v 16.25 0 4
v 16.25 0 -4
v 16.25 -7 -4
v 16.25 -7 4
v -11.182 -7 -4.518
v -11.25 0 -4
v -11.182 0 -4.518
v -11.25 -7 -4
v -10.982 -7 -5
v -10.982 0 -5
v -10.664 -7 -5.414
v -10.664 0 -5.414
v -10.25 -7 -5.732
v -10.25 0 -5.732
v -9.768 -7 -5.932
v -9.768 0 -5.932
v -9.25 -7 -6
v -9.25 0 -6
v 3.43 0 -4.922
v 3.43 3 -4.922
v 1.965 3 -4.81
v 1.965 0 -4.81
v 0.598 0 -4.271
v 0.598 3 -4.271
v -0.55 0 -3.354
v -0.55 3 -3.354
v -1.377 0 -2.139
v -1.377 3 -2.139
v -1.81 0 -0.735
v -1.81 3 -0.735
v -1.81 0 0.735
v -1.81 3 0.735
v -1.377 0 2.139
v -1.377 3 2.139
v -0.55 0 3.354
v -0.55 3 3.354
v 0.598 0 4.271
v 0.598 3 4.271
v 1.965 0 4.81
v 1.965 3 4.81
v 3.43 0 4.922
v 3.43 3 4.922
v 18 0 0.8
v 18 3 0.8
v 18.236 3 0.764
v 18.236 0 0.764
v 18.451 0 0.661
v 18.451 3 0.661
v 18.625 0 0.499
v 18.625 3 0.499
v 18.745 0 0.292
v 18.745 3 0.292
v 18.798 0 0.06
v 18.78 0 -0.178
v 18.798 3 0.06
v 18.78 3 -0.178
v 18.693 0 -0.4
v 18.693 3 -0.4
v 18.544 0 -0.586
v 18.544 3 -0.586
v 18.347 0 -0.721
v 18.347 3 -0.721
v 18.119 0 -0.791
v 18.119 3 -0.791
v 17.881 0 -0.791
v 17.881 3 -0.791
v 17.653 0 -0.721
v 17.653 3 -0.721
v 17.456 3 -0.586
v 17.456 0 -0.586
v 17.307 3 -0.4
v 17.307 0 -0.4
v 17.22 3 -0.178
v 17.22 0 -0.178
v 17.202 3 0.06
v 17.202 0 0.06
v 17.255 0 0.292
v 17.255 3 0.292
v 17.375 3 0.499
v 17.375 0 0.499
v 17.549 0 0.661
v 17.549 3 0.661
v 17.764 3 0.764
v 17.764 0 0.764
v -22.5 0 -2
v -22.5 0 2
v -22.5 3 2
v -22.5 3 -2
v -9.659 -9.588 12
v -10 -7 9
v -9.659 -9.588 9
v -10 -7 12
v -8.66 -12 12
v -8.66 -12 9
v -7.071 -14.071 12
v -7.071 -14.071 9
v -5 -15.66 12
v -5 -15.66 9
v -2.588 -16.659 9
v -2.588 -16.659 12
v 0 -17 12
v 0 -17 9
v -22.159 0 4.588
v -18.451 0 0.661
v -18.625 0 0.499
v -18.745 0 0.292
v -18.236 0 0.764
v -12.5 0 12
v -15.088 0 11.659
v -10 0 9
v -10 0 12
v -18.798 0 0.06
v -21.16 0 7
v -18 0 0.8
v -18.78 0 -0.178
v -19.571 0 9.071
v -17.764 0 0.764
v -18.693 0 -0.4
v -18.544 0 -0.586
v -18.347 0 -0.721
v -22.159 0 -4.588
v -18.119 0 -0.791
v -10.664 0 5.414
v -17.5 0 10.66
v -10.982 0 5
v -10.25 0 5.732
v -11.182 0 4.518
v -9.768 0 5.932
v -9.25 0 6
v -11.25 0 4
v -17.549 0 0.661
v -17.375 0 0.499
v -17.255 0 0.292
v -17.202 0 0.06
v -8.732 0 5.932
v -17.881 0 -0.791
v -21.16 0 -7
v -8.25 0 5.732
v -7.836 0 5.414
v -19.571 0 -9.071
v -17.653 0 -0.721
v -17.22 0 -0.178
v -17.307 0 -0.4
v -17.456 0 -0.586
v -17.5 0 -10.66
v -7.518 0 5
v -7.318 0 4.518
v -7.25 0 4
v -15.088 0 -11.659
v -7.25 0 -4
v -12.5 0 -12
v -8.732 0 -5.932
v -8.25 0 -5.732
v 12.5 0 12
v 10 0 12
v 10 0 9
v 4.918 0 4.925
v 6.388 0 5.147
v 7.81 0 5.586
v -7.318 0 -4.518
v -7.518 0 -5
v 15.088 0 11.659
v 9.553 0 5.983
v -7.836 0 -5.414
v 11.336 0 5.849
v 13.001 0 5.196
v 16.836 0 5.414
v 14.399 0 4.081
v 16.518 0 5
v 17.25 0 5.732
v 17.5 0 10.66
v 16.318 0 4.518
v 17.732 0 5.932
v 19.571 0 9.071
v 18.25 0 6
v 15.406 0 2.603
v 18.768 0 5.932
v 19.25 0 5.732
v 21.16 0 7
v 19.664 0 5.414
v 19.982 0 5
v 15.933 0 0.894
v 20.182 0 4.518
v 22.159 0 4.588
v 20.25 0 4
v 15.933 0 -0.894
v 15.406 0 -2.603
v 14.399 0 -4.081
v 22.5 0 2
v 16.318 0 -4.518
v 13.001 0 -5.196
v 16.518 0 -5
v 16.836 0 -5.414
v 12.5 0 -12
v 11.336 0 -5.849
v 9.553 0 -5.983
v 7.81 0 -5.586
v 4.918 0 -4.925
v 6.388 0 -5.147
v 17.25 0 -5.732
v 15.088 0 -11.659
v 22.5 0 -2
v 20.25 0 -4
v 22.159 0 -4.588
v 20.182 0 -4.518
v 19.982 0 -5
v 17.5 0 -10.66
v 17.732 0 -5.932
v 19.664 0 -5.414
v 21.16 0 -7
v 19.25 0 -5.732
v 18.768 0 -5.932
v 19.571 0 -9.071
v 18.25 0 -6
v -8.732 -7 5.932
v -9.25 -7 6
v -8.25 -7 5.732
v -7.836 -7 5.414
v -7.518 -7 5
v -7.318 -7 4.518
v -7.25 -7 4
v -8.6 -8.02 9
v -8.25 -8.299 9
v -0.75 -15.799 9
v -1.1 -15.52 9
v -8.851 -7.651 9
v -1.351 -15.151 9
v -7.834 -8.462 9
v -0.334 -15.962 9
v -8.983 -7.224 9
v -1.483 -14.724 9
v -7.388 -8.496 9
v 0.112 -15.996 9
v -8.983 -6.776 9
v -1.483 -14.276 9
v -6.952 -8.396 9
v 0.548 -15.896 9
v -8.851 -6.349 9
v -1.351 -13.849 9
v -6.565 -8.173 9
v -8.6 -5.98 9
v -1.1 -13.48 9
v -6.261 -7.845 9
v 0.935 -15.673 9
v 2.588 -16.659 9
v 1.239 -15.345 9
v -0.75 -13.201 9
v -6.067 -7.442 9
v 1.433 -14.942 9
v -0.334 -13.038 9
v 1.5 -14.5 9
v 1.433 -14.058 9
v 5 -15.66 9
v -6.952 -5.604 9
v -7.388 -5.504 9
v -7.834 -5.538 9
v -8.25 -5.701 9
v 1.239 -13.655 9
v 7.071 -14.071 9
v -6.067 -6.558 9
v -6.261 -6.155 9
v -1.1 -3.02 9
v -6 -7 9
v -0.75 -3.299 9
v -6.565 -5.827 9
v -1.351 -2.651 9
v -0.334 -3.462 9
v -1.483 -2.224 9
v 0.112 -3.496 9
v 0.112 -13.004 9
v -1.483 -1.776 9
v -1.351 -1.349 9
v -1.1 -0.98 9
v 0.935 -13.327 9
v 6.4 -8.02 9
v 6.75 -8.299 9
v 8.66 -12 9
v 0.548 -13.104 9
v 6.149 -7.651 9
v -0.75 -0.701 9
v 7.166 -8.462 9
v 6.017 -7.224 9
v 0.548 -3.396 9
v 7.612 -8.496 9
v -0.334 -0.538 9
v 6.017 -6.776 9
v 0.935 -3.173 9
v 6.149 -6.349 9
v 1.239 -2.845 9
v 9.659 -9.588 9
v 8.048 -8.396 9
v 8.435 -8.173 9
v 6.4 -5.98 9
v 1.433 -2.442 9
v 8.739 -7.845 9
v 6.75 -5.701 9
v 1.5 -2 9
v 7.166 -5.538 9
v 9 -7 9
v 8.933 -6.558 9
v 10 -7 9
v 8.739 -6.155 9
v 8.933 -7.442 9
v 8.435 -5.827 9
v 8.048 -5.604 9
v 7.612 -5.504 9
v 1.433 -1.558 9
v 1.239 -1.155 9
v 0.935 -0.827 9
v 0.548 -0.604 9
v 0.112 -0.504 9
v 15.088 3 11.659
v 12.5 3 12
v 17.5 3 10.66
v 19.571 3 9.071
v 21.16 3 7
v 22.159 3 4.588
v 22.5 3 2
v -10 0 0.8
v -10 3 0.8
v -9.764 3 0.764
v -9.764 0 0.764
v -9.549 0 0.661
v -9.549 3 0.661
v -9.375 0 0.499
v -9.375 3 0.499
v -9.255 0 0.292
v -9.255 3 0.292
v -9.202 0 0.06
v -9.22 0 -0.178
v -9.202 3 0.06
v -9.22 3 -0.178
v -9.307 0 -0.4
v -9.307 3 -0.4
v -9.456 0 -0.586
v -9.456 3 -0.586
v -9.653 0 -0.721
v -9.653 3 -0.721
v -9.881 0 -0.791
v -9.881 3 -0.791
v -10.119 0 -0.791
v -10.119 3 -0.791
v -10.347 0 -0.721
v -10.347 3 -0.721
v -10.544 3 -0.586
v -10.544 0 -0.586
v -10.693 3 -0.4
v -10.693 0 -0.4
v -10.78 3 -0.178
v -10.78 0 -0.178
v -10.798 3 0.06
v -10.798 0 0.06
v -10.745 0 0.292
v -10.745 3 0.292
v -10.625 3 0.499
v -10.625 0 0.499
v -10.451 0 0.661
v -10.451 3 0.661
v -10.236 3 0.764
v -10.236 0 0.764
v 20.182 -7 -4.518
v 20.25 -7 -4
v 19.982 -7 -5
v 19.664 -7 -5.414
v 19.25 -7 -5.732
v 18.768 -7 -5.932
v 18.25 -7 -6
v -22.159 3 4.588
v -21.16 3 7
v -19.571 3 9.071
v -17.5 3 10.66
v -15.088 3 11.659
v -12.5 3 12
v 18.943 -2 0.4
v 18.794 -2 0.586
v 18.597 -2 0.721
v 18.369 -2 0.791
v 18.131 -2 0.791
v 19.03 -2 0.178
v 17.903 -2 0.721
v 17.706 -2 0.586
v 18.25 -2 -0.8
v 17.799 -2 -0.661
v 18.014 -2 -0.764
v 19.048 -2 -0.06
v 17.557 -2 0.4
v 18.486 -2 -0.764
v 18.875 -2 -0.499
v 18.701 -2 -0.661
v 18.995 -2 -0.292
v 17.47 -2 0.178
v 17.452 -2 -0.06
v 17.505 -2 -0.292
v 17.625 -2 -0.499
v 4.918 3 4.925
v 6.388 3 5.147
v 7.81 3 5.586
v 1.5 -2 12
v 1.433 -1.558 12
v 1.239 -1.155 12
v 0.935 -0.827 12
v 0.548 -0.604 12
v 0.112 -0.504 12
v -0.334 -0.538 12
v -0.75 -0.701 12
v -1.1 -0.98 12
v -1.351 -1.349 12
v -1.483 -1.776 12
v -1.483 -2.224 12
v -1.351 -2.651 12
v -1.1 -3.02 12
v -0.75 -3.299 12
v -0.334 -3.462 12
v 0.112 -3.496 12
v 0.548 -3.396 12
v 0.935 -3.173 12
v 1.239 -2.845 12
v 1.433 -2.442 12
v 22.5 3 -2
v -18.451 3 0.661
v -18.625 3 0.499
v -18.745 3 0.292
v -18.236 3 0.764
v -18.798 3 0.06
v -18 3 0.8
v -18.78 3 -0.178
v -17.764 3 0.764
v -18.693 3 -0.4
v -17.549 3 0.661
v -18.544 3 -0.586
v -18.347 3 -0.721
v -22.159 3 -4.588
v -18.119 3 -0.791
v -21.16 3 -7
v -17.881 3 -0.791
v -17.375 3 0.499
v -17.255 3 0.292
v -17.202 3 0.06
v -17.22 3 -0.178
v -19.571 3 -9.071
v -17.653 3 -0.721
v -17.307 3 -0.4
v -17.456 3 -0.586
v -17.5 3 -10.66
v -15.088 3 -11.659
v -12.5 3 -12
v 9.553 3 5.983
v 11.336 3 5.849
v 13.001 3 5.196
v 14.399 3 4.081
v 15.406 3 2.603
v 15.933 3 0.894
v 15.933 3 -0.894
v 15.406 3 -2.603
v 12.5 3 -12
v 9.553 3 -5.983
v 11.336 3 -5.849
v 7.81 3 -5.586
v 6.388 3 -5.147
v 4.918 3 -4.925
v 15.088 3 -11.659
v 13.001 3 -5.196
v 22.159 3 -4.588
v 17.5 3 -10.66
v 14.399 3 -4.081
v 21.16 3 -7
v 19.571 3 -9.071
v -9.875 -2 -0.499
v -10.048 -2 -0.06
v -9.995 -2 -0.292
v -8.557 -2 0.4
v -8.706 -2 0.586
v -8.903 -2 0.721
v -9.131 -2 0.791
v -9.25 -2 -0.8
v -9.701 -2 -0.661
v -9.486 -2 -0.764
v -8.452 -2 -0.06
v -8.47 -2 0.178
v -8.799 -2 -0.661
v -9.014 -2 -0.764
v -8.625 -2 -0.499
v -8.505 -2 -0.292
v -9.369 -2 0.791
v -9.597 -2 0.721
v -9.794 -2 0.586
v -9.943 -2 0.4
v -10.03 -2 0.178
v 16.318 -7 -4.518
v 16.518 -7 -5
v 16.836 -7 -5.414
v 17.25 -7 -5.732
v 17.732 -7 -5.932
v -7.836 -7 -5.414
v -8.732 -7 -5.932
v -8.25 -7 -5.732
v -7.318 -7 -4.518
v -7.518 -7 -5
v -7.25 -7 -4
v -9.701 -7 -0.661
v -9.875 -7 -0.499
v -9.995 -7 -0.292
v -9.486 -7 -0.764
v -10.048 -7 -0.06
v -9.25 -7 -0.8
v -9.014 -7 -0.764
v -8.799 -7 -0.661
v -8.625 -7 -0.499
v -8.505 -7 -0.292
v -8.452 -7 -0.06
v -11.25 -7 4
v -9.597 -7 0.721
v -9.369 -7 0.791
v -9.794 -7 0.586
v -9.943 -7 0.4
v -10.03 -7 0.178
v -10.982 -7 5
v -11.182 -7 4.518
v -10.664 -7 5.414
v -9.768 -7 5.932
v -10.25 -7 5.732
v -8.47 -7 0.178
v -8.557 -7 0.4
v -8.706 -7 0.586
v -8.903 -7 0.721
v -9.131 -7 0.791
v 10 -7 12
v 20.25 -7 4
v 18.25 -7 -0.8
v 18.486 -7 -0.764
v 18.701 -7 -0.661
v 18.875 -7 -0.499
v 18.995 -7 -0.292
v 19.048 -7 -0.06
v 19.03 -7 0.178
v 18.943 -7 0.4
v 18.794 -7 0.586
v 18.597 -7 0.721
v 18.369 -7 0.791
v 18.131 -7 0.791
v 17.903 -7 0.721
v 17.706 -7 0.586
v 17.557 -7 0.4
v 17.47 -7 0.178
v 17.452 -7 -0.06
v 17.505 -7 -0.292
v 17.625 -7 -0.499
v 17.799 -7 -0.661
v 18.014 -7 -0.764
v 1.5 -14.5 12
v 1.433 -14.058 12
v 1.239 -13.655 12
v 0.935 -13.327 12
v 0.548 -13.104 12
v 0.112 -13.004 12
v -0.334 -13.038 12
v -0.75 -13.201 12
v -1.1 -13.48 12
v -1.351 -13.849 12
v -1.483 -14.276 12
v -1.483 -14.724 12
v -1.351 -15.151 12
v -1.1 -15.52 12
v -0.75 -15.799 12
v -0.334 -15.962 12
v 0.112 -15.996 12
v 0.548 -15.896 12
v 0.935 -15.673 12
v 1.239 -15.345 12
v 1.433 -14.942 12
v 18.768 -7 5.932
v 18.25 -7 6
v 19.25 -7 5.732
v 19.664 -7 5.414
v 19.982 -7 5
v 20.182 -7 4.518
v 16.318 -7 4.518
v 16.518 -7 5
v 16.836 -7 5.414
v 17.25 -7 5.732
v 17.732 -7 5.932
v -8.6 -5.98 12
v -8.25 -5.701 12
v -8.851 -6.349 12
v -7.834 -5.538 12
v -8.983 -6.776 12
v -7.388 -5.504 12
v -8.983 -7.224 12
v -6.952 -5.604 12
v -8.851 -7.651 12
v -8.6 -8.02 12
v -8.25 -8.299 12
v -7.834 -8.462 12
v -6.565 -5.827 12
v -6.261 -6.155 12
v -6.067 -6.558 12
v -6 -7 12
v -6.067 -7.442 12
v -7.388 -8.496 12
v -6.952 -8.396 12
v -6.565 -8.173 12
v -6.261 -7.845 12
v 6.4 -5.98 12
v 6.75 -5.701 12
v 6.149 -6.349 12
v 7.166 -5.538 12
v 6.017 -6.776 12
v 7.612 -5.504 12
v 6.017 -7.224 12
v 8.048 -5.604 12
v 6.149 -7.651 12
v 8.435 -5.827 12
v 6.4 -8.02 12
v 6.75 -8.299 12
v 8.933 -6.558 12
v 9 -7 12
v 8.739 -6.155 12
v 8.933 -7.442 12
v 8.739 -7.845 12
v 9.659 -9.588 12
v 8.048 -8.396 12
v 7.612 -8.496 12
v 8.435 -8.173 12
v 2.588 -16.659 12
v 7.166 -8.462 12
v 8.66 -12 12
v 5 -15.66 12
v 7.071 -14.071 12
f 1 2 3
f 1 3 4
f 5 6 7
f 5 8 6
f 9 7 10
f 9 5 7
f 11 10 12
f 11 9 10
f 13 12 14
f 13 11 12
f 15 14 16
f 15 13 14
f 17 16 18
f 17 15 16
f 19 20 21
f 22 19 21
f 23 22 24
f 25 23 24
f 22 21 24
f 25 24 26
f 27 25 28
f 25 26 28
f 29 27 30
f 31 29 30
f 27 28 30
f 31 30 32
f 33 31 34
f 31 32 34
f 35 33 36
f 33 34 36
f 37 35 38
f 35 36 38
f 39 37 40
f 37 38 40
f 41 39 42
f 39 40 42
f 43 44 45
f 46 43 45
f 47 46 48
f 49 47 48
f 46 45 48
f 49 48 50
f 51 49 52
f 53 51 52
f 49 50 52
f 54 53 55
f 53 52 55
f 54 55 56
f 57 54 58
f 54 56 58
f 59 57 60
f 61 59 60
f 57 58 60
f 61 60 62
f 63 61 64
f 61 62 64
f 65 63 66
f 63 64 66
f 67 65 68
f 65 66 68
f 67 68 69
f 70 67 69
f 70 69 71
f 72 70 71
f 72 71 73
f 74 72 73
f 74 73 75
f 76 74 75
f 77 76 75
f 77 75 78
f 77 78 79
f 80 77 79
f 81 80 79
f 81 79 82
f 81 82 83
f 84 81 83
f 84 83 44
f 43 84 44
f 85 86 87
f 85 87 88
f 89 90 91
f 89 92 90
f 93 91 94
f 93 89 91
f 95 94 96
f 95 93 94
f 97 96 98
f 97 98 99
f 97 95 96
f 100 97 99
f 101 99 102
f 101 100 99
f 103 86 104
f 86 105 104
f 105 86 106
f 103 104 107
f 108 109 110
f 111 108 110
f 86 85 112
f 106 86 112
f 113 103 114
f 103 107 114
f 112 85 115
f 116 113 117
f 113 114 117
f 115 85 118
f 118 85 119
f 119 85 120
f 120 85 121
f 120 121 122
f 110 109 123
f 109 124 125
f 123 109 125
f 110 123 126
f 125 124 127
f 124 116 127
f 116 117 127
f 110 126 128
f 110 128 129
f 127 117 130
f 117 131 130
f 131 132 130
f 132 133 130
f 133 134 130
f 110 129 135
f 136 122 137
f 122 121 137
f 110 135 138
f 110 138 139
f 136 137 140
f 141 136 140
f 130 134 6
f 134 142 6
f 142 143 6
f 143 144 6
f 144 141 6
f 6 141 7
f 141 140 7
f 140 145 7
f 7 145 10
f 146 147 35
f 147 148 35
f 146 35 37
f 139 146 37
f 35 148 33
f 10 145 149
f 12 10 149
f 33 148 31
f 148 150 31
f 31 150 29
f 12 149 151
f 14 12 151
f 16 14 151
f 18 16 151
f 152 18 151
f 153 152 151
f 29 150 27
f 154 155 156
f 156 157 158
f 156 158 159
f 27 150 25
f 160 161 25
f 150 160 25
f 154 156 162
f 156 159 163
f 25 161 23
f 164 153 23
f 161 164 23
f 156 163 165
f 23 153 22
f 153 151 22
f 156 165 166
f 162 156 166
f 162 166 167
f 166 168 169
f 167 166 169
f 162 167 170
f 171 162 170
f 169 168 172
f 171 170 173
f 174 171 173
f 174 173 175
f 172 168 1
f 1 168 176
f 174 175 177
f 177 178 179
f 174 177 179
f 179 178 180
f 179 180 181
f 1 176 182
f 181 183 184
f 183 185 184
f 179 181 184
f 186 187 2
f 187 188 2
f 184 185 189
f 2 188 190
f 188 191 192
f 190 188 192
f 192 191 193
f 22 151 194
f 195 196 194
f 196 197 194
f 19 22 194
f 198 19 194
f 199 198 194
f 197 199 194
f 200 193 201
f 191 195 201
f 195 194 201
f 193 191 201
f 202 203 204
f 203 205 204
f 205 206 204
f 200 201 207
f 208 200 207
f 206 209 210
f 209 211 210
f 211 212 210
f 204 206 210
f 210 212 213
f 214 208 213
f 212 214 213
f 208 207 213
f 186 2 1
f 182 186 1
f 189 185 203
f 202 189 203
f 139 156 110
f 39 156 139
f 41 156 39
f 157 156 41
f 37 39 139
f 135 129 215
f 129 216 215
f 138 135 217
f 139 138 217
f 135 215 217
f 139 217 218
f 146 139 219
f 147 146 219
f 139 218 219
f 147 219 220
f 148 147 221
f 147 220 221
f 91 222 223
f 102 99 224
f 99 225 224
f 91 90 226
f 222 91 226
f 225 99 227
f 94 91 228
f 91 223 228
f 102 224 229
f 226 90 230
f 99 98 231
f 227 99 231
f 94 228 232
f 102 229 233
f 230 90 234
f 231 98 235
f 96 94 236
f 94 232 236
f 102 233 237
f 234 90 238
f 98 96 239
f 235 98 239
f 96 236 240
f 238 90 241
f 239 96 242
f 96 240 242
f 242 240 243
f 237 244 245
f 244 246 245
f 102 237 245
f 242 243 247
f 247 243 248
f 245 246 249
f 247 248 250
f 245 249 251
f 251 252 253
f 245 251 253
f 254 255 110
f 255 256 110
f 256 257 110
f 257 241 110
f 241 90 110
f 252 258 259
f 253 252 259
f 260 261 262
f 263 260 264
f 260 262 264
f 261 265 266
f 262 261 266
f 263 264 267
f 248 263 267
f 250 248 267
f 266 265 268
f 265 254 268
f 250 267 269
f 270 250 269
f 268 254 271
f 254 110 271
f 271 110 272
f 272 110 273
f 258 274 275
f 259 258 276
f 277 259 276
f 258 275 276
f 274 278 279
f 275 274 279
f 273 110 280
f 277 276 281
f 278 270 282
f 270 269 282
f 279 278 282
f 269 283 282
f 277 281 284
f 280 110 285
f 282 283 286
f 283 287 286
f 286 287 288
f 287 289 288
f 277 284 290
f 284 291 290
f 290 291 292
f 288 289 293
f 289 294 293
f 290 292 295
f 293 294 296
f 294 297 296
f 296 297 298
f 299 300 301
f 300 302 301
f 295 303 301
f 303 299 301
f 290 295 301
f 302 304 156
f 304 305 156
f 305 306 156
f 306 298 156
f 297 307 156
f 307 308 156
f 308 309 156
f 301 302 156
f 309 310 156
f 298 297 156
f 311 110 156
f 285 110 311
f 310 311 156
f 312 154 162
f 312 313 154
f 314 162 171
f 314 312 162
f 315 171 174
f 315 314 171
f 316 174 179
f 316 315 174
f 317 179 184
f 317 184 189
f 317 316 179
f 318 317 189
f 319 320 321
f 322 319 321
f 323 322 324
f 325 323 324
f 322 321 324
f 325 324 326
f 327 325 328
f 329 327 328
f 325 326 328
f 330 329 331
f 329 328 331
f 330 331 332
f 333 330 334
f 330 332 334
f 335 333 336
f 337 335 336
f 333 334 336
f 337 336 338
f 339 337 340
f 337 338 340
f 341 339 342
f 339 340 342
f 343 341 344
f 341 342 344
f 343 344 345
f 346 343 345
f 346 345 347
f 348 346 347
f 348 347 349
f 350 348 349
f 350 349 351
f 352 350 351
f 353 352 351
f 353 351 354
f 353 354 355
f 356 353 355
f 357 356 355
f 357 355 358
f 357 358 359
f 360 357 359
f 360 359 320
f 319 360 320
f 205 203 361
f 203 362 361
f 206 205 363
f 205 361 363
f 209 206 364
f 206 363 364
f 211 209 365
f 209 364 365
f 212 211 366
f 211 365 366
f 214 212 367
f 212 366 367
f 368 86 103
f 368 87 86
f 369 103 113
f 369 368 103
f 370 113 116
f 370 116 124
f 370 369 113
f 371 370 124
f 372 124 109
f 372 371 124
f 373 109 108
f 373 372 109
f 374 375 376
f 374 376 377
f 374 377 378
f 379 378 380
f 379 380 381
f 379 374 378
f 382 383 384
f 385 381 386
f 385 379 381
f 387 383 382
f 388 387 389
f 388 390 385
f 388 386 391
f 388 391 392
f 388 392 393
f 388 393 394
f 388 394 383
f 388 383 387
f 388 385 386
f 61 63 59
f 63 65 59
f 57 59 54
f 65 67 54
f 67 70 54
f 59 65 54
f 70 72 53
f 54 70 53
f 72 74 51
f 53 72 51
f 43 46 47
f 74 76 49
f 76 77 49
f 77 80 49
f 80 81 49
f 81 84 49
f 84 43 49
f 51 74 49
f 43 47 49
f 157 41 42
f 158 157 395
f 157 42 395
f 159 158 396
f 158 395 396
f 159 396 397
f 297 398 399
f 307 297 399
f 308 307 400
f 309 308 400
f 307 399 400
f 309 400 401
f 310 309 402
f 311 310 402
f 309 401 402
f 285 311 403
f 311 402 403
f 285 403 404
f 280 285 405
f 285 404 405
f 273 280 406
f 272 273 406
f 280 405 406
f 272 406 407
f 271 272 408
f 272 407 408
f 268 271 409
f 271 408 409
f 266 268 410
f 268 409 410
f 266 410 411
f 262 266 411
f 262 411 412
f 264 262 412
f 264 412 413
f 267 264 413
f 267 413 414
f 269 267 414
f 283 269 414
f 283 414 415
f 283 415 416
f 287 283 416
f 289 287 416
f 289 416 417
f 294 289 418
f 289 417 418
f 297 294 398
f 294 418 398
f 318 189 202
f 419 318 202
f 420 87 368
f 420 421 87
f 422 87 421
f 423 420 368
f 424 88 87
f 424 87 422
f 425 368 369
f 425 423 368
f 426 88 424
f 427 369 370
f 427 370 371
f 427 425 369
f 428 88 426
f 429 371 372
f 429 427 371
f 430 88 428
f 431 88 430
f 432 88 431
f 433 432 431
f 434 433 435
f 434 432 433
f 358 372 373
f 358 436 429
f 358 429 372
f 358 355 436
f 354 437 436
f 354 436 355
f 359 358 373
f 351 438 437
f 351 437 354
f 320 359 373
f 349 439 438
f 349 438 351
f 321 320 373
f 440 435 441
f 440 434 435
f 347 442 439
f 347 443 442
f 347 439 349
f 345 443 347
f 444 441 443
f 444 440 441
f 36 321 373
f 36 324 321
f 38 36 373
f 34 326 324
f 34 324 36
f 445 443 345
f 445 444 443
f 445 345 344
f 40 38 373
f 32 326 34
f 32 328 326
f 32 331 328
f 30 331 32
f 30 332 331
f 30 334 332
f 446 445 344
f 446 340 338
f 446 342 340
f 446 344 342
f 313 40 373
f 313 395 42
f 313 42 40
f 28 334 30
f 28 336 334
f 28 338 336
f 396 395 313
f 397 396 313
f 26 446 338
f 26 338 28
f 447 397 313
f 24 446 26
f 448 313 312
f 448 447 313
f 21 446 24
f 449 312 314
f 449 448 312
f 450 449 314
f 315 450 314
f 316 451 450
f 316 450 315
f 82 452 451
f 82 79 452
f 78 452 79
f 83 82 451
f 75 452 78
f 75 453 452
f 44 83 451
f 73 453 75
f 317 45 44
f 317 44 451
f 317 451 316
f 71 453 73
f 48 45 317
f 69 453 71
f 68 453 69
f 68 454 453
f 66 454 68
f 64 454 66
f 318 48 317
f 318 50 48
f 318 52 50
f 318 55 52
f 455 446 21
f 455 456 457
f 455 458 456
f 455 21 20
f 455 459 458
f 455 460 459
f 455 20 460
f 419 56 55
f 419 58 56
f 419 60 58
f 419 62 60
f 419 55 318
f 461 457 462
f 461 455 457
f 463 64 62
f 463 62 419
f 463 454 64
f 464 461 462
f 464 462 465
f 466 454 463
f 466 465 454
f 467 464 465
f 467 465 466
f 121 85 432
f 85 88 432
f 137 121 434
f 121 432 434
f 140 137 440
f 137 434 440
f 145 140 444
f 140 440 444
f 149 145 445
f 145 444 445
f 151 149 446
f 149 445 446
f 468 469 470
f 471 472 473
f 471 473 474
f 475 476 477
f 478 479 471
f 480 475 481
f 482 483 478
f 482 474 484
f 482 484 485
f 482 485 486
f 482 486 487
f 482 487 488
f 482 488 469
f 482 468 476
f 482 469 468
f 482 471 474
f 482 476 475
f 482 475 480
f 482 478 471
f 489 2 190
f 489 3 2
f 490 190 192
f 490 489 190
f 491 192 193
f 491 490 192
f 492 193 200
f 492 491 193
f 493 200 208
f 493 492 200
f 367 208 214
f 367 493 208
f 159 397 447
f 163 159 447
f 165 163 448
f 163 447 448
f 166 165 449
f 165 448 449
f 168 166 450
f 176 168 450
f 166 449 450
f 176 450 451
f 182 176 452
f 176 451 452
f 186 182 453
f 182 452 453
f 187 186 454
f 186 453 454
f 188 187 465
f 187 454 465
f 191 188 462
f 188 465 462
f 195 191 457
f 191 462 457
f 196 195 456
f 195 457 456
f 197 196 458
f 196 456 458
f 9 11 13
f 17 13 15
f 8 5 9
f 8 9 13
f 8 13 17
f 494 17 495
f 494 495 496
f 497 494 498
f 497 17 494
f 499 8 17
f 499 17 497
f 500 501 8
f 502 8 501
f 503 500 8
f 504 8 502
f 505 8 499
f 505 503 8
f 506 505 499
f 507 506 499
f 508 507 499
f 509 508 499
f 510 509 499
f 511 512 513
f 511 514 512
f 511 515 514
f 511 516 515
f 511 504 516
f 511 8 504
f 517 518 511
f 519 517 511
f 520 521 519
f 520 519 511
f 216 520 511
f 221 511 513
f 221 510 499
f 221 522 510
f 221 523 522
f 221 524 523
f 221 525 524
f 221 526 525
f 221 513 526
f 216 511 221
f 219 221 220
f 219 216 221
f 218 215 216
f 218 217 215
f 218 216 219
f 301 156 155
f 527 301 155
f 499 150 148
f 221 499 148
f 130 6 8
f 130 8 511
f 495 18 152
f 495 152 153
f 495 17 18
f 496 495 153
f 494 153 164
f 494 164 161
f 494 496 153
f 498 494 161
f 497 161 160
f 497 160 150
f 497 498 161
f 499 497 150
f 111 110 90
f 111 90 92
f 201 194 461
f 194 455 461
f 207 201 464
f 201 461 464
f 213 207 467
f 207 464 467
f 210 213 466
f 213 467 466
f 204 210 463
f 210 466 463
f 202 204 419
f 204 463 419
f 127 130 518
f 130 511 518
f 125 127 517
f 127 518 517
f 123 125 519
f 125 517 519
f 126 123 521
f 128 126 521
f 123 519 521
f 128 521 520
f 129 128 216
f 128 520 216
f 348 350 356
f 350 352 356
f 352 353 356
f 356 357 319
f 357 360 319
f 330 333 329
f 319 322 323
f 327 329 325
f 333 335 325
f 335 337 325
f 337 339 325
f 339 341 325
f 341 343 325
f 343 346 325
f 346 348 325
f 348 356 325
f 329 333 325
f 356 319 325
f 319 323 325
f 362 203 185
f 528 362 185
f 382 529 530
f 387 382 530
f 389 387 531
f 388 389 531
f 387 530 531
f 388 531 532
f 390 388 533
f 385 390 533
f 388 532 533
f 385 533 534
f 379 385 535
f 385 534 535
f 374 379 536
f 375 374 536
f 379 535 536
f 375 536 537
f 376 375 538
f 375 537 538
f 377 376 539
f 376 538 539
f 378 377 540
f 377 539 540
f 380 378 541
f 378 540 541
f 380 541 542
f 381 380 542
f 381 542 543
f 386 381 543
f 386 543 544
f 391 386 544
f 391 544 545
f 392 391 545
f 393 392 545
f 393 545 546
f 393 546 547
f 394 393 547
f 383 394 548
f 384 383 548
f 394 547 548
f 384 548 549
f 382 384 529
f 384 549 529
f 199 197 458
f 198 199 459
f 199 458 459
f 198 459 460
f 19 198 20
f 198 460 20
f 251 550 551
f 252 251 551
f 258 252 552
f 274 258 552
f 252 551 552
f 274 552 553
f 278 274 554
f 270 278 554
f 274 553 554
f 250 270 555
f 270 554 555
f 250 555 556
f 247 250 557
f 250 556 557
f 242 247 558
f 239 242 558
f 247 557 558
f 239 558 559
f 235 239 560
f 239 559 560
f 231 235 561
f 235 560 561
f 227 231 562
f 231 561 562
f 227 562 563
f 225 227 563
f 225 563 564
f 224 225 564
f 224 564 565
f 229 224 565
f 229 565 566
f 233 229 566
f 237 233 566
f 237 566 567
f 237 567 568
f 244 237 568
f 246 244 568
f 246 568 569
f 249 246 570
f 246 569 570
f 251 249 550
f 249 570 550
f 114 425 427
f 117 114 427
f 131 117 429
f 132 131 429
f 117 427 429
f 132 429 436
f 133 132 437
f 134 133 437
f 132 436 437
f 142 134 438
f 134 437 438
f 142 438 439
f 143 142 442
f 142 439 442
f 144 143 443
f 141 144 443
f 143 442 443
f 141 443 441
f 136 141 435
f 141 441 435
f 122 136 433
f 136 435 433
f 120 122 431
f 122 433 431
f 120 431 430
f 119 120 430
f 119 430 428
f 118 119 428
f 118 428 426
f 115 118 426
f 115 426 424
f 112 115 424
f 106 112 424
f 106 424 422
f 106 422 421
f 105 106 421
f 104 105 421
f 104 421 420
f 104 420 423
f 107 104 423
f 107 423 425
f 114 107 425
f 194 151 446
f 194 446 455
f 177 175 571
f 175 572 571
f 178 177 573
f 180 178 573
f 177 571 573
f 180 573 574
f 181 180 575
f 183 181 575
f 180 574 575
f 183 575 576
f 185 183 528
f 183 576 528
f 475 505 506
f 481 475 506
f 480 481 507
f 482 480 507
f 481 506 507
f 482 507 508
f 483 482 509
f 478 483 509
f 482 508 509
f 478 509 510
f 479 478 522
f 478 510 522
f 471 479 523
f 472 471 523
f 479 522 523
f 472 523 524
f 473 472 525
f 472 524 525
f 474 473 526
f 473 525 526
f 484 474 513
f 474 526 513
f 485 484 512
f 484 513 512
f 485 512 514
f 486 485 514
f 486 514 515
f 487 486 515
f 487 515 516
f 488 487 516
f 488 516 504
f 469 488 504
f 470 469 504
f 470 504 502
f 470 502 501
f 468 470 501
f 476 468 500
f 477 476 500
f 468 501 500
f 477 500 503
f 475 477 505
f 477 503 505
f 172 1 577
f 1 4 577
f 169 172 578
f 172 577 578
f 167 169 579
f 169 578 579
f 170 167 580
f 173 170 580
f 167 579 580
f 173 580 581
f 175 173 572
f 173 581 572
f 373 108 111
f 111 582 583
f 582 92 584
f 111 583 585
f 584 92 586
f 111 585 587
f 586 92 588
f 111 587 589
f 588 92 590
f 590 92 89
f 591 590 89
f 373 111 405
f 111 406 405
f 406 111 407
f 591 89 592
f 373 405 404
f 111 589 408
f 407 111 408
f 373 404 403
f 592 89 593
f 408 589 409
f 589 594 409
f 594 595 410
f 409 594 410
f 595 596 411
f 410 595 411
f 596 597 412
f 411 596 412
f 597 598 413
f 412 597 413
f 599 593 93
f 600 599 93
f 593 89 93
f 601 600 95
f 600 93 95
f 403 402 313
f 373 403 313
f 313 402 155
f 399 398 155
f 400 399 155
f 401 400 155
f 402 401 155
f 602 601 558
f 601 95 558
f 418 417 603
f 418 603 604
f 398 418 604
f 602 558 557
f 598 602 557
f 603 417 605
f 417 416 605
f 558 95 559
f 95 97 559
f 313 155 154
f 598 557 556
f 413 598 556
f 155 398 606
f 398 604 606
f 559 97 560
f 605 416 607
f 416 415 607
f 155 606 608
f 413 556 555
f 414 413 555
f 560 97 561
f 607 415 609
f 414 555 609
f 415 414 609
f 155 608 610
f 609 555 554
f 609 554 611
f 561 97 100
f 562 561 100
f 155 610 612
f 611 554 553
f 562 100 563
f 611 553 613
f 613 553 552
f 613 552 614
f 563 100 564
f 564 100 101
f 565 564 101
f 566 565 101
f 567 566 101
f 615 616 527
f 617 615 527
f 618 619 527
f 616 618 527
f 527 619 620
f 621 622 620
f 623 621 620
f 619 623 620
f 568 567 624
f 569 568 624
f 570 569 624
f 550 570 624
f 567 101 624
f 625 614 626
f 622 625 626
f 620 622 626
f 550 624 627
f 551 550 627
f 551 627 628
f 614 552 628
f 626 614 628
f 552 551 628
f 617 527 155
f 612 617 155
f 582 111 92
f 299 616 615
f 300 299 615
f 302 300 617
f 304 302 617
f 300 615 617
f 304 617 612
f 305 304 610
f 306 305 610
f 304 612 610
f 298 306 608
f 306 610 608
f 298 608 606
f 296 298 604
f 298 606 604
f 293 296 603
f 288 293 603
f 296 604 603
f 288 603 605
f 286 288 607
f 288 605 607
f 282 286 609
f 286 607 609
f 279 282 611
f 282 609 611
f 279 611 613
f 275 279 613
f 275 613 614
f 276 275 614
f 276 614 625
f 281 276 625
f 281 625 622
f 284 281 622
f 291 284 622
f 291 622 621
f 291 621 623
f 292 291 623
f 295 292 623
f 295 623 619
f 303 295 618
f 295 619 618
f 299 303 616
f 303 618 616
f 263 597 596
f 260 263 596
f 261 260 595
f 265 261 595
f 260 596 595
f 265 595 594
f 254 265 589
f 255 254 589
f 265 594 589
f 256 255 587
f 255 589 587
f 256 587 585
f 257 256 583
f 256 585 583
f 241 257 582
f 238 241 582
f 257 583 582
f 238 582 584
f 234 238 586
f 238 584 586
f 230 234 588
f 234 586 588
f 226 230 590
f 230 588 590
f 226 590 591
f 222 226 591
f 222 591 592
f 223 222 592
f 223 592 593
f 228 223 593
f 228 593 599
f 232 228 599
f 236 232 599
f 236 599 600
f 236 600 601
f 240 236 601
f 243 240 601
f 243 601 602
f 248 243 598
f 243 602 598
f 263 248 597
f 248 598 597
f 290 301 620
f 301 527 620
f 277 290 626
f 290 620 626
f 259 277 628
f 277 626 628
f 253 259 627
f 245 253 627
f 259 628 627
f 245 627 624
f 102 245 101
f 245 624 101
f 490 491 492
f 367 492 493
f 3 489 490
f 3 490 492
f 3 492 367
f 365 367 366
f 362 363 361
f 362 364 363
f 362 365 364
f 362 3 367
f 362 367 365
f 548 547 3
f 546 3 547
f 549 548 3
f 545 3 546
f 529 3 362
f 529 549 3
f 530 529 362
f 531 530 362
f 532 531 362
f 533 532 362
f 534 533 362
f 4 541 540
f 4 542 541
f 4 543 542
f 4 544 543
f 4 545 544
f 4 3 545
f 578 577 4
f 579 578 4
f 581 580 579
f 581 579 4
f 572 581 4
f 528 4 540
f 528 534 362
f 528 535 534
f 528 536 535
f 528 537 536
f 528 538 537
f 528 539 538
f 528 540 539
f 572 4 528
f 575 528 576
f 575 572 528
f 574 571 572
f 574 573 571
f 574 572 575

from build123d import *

# Parameters (mm, degrees)
SKETCH1_W           = 45
SKETCH1_H           = 24
BOSS_EXTRUDE1_DEPTH = 3
SKETCH2_R           = 0.8
CUT_EXTRUDE1_DEPTH  = 26.675864153
SKETCH3_W           = 4
SKETCH3_H           = 12
BOSS_EXTRUDE2_DEPTH = 7
SKETCH4_R           = 0.8
CUT_EXTRUDE2_DEPTH  = 5
FILLET1_R           = 2
FILLET2_R           = 10
SKETCH6_W           = 20
SKETCH6_H           = 3
BOSS_EXTRUDE3_DEPTH = 17
FILLET3_R           = 10
SKETCH7_R           = 1.5
CUT_EXTRUDE3_DEPTH  = 3


with BuildPart() as part:
    # Sketch1 → Boss-Extrude1 (new body)
    with BuildSketch(Plane(origin=(0, 0, 0), x_dir=(1, 0, 0), z_dir=(0, 1, 0))):
        Rectangle(SKETCH1_W, SKETCH1_H)
    extrude(amount=BOSS_EXTRUDE1_DEPTH)

    # Sketch2 → Cut-Extrude1 (cut, through all)
    with BuildSketch(Plane(origin=(0, 3, 0), x_dir=(1, 0, 0), z_dir=(0, 1, 0))):
        with Locations(Location((18, 0, 0), (0, 0, 270))):
            Circle(SKETCH2_R)
        with Locations(Location((-10, 0, 0), (0, 0, 270))):
            Circle(SKETCH2_R)
        with Locations(Location((-18, 0, 0), (0, 0, 270))):
            Circle(SKETCH2_R)
        with BuildLine():
            ThreePointArc((7.809591844, -5.585885079), (16, 0), (7.809591844, 5.585885079))
            ThreePointArc((7.809591844, 5.585885079), (5.65712524, 5.008562723), (3.430251149, 4.922276176))
            ThreePointArc((3.430251149, 4.922276176), (-1.864767372, 0), (3.430251149, -4.922276176))
            ThreePointArc((3.430251149, -4.922276176), (5.65712524, -5.008562723), (7.809591844, -5.585885079))
        make_face()
    extrude(amount=-CUT_EXTRUDE1_DEPTH, mode=Mode.SUBTRACT)

    # Sketch3 → Boss-Extrude2 (add)
    with BuildSketch(Plane.XZ):
        with Locations((-9.25, 0)):
            Rectangle(SKETCH3_W, SKETCH3_H)
        with Locations((18.25, 0)):
            Rectangle(SKETCH3_W, SKETCH3_H)
    extrude(amount=BOSS_EXTRUDE2_DEPTH)

    # Sketch4 → Cut-Extrude2 (cut)
    with BuildSketch(Plane.XZ.offset(7)):
        with Locations(Location((18.25, 0, 0), (0, 0, 270))):
            Circle(SKETCH4_R)
        with Locations(Location((-9.25, 0, 0), (0, 0, 270))):
            Circle(SKETCH4_R)
    extrude(amount=-CUT_EXTRUDE2_DEPTH, mode=Mode.SUBTRACT)

    # Fillet1
    fillet1_edges = [part.edges().sort_by_distance(p)[0] for p in [
        (16.25, -3.5, -6),
        (-11.25, -3.5, -6),
        (-7.25, -3.5, -6),
        (20.25, -3.5, -6),
        (-11.25, -3.5, 6),
        (-7.25, -3.5, 6),
        (16.25, -3.5, 6),
        (20.25, -3.5, 6),
    ]]
    fillet(fillet1_edges, radius=FILLET1_R - 0.0001)  # a hair under: the kernel refuses the full size

    # Fillet2
    fillet2_edges = [part.edges().sort_by_distance(p)[0] for p in [
        (-22.5, 1.5, -12),
        (22.5, 1.5, -12),
        (22.5, 1.5, 12),
        (-22.5, 1.5, 12),
    ]]
    fillet(fillet2_edges, radius=FILLET2_R)

    # Sketch6 → Boss-Extrude3 (add)
    with BuildSketch(Plane.XZ):
        with Locations((0, 10.5)):
            Rectangle(SKETCH6_W, SKETCH6_H)
    extrude(amount=BOSS_EXTRUDE3_DEPTH)

    # Fillet3
    fillet3_edges = [part.edges().sort_by_distance(p)[0] for p in [
        (-10, -17, 10.5),
        (10, -17, 10.5),
    ]]
    fillet(fillet3_edges, radius=FILLET3_R - 0.0001)  # a hair under: the kernel refuses the full size

    # Sketch7 → Cut-Extrude3 (cut)
    with BuildSketch(Plane.XY.offset(12)):
        with Locations((0, -14.5)):
            Circle(SKETCH7_R)
        with Locations((0, -2)):
            Circle(SKETCH7_R)
        with Locations((7.5, -7)):
            Circle(SKETCH7_R)
        with Locations((-7.5, -7)):
            Circle(SKETCH7_R)
    extrude(amount=-CUT_EXTRUDE3_DEPTH, mode=Mode.SUBTRACT)


solid = part.part
